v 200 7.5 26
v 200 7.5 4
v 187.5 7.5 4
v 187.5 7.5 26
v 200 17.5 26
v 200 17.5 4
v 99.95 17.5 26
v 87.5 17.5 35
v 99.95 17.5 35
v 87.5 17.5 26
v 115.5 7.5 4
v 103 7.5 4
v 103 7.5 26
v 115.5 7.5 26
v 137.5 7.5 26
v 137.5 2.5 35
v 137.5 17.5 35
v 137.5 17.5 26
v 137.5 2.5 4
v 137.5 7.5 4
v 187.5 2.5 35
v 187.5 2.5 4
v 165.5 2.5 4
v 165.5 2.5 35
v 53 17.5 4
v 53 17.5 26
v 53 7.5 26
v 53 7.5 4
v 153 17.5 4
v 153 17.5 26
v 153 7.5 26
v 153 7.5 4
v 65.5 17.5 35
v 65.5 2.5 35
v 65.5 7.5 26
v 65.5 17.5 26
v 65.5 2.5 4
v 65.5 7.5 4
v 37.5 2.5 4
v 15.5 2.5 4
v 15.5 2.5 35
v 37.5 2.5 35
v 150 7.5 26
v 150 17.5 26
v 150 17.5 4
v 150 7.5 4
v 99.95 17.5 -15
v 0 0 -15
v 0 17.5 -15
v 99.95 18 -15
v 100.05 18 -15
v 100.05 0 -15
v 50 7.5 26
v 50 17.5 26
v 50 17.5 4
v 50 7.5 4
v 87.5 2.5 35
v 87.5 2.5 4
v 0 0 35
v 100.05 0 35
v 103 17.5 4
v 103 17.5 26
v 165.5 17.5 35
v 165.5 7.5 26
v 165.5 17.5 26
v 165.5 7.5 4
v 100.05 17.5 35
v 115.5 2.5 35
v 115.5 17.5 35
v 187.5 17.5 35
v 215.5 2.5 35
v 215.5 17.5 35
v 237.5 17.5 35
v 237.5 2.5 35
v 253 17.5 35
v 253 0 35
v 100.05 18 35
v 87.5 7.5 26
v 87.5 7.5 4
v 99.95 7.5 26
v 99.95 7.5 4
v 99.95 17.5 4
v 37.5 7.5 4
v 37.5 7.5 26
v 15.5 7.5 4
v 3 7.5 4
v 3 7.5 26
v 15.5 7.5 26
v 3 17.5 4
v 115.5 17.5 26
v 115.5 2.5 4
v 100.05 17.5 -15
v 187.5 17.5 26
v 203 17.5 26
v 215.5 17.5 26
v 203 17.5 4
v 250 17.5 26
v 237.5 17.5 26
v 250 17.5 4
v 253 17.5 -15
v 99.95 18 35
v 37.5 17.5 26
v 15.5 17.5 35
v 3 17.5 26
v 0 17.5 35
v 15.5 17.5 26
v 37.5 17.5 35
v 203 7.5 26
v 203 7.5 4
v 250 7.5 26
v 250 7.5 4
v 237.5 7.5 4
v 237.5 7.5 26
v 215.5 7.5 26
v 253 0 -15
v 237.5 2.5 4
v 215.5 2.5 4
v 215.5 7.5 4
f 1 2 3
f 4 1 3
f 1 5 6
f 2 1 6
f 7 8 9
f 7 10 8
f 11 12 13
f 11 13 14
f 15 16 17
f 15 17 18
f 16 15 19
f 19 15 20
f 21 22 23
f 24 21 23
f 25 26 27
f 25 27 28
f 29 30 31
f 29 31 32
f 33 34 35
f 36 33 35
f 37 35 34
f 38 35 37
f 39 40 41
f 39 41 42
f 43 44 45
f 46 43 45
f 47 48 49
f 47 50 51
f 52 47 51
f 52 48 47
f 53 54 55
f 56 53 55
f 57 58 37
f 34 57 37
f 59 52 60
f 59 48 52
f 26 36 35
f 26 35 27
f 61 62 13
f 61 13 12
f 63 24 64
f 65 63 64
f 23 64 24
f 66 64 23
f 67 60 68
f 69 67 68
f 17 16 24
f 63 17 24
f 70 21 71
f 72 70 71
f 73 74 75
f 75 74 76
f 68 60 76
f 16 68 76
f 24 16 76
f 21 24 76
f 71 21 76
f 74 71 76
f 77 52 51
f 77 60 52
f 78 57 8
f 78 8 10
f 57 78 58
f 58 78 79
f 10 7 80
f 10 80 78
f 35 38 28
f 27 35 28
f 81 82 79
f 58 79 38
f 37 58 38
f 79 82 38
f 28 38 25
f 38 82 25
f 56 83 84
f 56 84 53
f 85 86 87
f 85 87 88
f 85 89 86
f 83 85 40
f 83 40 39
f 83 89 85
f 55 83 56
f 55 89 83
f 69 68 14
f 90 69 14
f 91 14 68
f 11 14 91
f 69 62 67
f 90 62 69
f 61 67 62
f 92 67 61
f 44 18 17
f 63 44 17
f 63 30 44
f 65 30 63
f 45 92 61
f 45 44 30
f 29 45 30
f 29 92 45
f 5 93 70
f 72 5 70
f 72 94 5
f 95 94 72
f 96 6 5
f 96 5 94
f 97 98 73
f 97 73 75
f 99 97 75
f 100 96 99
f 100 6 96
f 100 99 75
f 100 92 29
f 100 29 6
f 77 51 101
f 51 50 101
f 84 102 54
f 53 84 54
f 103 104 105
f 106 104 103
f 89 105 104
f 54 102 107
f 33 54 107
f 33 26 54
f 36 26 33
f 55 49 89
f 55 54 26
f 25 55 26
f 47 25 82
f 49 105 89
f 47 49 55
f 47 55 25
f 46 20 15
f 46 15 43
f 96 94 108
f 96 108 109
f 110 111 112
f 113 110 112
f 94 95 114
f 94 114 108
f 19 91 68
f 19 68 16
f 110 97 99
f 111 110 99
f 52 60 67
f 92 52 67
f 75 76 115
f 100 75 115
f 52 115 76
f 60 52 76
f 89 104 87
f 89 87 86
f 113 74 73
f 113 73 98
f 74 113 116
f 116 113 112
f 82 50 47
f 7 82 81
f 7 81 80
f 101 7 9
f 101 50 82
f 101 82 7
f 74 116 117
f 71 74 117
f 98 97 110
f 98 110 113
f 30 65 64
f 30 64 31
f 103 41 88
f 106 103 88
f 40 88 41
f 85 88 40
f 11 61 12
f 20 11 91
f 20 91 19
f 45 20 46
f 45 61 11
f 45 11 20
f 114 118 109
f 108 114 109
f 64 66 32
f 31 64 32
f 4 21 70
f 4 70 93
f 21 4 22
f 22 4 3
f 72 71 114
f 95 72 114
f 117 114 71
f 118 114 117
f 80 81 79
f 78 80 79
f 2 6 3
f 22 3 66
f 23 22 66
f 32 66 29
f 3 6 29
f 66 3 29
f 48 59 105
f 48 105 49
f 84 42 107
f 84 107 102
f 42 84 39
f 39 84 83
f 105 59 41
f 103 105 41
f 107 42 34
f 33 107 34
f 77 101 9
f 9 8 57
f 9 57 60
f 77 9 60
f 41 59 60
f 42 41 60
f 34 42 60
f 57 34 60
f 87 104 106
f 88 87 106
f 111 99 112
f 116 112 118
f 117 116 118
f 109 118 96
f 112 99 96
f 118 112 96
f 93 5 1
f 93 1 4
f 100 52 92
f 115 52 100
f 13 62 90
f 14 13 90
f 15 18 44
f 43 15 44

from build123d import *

# Parameters (mm, degrees)
SKETCH1_W               = 253
SKETCH1_H               = 50
BOSS_EXTRUDE1_DEPTH     = 17.5
SKETCH2_W               = 47
SKETCH2_H               = 22
CUT_EXTRUDE1_DEPTH      = 10
SKETCH4_W               = 22
SKETCH4_H               = 31
CUT_EXTRUDE2_DEPTH      = 15
MIRROR2_COPY_1_SKETCH_W = 47
MIRROR2_COPY_1_SKETCH_H = 22
MIRROR2_COPY_1_DEPTH    = 10
MIRROR2_COPY_2_SKETCH_W = 22
MIRROR2_COPY_2_SKETCH_H = 31
MIRROR2_COPY_2_DEPTH    = 15
MIRROR2_COPY_3_SKETCH_W = 47
MIRROR2_COPY_3_SKETCH_H = 22
MIRROR2_COPY_3_DEPTH    = 10
MIRROR2_COPY_4_SKETCH_W = 22
MIRROR2_COPY_4_SKETCH_H = 31
MIRROR2_COPY_4_DEPTH    = 15
SKETCH5_W               = 50
SKETCH5_H               = 18
BOSS_EXTRUDE2_DEPTH     = 0.05


with BuildPart() as part:
    # Sketch1 → Boss-Extrude1 (new body)
    with BuildSketch(Plane(origin=(0, 0, 0), x_dir=(1, 0, 0), z_dir=(0, 1, 0))):
        with Locations((126.5, -10)):
            Rectangle(SKETCH1_W, SKETCH1_H)
    extrude(amount=BOSS_EXTRUDE1_DEPTH)

    # Sketch2 → Cut-Extrude1 (cut)
    with BuildSketch(Plane(origin=(0, 17.5, 0), x_dir=(1, 0, 0), z_dir=(0, 1, 0))):
        with Locations((26.5, -15)):
            Rectangle(SKETCH2_W, SKETCH2_H)
    cut_extrude1 = extrude(amount=-CUT_EXTRUDE1_DEPTH, mode=Mode.SUBTRACT)

    # Sketch4 → Cut-Extrude2 (cut)
    with BuildSketch(Plane(origin=(0, 17.5, 0), x_dir=(1, 0, 0), z_dir=(0, 1, 0))):
        with Locations((26.5, -19.5)):
            Rectangle(SKETCH4_W, SKETCH4_H)
    cut_extrude2 = extrude(amount=-CUT_EXTRUDE2_DEPTH, mode=Mode.SUBTRACT)

    # Mirror1: Cut-Extrude1, Cut-Extrude2 across plane
    add(cut_extrude1.mirror(Plane.ZY.offset(-51.5)), mode=Mode.SUBTRACT)
    add(cut_extrude2.mirror(Plane.ZY.offset(-51.5)), mode=Mode.SUBTRACT)

    # Mirror2 copy 1 sketch → Mirror2 copy 1 (cut)
    with BuildSketch(Plane(origin=(100, 17.5, 0), x_dir=(1, 0, 0), z_dir=(0, 1, 0))):
        with Locations((26.5, -15)):
            Rectangle(MIRROR2_COPY_1_SKETCH_W, MIRROR2_COPY_1_SKETCH_H)
    extrude(amount=-MIRROR2_COPY_1_DEPTH, mode=Mode.SUBTRACT)

    # Mirror2 copy 2 sketch → Mirror2 copy 2 (cut)
    with BuildSketch(Plane(origin=(100, 17.5, 0), x_dir=(1, 0, 0), z_dir=(0, 1, 0))):
        with Locations((26.5, -19.5)):
            Rectangle(MIRROR2_COPY_2_SKETCH_W, MIRROR2_COPY_2_SKETCH_H)
    extrude(amount=-MIRROR2_COPY_2_DEPTH, mode=Mode.SUBTRACT)

    # Mirror2 copy 3 sketch → Mirror2 copy 3 (cut)
    with BuildSketch(Plane(origin=(203, 17.5, 0), x_dir=(-1, 0, 0), z_dir=(0, 1, 0))):
        with Locations((26.5, 15)):
            Rectangle(MIRROR2_COPY_3_SKETCH_W, MIRROR2_COPY_3_SKETCH_H)
    extrude(amount=-MIRROR2_COPY_3_DEPTH, mode=Mode.SUBTRACT)

    # Mirror2 copy 4 sketch → Mirror2 copy 4 (cut)
    with BuildSketch(Plane(origin=(203, 17.5, 0), x_dir=(-1, 0, 0), z_dir=(0, 1, 0))):
        with Locations((26.5, 19.5)):
            Rectangle(MIRROR2_COPY_4_SKETCH_W, MIRROR2_COPY_4_SKETCH_H)
    extrude(amount=-MIRROR2_COPY_4_DEPTH, mode=Mode.SUBTRACT)

    # Mirror3: Cut-Extrude1, Cut-Extrude2 across plane
    add(cut_extrude1.mirror(Plane.ZY.offset(-126.5)), mode=Mode.SUBTRACT)
    add(cut_extrude2.mirror(Plane.ZY.offset(-126.5)), mode=Mode.SUBTRACT)

    # Sketch5 → Boss-Extrude2 (add, symmetric)
    with BuildSketch(Plane.ZY.offset(-100)):
        with Locations((10, 9)):
            Rectangle(SKETCH5_W, SKETCH5_H)
    extrude(amount=BOSS_EXTRUDE2_DEPTH, both=True)


with BuildPart() as body_2:
    # Split1: the piece on the far side of the plane
    add(part.part)
    split(bisect_by=Plane(origin=(100.05, 0, 0), x_dir=(0, 0, -1), z_dir=(-1, 0, 0)), keep=Keep.BOTTOM)


with BuildPart() as part_1:
    add(part.part)

    # Split1
    split(bisect_by=Plane(origin=(100.05, 0, 0), x_dir=(0, 0, -1), z_dir=(-1, 0, 0)), keep=Keep.TOP)


solid = Compound([body_2.part, part_1.part])
